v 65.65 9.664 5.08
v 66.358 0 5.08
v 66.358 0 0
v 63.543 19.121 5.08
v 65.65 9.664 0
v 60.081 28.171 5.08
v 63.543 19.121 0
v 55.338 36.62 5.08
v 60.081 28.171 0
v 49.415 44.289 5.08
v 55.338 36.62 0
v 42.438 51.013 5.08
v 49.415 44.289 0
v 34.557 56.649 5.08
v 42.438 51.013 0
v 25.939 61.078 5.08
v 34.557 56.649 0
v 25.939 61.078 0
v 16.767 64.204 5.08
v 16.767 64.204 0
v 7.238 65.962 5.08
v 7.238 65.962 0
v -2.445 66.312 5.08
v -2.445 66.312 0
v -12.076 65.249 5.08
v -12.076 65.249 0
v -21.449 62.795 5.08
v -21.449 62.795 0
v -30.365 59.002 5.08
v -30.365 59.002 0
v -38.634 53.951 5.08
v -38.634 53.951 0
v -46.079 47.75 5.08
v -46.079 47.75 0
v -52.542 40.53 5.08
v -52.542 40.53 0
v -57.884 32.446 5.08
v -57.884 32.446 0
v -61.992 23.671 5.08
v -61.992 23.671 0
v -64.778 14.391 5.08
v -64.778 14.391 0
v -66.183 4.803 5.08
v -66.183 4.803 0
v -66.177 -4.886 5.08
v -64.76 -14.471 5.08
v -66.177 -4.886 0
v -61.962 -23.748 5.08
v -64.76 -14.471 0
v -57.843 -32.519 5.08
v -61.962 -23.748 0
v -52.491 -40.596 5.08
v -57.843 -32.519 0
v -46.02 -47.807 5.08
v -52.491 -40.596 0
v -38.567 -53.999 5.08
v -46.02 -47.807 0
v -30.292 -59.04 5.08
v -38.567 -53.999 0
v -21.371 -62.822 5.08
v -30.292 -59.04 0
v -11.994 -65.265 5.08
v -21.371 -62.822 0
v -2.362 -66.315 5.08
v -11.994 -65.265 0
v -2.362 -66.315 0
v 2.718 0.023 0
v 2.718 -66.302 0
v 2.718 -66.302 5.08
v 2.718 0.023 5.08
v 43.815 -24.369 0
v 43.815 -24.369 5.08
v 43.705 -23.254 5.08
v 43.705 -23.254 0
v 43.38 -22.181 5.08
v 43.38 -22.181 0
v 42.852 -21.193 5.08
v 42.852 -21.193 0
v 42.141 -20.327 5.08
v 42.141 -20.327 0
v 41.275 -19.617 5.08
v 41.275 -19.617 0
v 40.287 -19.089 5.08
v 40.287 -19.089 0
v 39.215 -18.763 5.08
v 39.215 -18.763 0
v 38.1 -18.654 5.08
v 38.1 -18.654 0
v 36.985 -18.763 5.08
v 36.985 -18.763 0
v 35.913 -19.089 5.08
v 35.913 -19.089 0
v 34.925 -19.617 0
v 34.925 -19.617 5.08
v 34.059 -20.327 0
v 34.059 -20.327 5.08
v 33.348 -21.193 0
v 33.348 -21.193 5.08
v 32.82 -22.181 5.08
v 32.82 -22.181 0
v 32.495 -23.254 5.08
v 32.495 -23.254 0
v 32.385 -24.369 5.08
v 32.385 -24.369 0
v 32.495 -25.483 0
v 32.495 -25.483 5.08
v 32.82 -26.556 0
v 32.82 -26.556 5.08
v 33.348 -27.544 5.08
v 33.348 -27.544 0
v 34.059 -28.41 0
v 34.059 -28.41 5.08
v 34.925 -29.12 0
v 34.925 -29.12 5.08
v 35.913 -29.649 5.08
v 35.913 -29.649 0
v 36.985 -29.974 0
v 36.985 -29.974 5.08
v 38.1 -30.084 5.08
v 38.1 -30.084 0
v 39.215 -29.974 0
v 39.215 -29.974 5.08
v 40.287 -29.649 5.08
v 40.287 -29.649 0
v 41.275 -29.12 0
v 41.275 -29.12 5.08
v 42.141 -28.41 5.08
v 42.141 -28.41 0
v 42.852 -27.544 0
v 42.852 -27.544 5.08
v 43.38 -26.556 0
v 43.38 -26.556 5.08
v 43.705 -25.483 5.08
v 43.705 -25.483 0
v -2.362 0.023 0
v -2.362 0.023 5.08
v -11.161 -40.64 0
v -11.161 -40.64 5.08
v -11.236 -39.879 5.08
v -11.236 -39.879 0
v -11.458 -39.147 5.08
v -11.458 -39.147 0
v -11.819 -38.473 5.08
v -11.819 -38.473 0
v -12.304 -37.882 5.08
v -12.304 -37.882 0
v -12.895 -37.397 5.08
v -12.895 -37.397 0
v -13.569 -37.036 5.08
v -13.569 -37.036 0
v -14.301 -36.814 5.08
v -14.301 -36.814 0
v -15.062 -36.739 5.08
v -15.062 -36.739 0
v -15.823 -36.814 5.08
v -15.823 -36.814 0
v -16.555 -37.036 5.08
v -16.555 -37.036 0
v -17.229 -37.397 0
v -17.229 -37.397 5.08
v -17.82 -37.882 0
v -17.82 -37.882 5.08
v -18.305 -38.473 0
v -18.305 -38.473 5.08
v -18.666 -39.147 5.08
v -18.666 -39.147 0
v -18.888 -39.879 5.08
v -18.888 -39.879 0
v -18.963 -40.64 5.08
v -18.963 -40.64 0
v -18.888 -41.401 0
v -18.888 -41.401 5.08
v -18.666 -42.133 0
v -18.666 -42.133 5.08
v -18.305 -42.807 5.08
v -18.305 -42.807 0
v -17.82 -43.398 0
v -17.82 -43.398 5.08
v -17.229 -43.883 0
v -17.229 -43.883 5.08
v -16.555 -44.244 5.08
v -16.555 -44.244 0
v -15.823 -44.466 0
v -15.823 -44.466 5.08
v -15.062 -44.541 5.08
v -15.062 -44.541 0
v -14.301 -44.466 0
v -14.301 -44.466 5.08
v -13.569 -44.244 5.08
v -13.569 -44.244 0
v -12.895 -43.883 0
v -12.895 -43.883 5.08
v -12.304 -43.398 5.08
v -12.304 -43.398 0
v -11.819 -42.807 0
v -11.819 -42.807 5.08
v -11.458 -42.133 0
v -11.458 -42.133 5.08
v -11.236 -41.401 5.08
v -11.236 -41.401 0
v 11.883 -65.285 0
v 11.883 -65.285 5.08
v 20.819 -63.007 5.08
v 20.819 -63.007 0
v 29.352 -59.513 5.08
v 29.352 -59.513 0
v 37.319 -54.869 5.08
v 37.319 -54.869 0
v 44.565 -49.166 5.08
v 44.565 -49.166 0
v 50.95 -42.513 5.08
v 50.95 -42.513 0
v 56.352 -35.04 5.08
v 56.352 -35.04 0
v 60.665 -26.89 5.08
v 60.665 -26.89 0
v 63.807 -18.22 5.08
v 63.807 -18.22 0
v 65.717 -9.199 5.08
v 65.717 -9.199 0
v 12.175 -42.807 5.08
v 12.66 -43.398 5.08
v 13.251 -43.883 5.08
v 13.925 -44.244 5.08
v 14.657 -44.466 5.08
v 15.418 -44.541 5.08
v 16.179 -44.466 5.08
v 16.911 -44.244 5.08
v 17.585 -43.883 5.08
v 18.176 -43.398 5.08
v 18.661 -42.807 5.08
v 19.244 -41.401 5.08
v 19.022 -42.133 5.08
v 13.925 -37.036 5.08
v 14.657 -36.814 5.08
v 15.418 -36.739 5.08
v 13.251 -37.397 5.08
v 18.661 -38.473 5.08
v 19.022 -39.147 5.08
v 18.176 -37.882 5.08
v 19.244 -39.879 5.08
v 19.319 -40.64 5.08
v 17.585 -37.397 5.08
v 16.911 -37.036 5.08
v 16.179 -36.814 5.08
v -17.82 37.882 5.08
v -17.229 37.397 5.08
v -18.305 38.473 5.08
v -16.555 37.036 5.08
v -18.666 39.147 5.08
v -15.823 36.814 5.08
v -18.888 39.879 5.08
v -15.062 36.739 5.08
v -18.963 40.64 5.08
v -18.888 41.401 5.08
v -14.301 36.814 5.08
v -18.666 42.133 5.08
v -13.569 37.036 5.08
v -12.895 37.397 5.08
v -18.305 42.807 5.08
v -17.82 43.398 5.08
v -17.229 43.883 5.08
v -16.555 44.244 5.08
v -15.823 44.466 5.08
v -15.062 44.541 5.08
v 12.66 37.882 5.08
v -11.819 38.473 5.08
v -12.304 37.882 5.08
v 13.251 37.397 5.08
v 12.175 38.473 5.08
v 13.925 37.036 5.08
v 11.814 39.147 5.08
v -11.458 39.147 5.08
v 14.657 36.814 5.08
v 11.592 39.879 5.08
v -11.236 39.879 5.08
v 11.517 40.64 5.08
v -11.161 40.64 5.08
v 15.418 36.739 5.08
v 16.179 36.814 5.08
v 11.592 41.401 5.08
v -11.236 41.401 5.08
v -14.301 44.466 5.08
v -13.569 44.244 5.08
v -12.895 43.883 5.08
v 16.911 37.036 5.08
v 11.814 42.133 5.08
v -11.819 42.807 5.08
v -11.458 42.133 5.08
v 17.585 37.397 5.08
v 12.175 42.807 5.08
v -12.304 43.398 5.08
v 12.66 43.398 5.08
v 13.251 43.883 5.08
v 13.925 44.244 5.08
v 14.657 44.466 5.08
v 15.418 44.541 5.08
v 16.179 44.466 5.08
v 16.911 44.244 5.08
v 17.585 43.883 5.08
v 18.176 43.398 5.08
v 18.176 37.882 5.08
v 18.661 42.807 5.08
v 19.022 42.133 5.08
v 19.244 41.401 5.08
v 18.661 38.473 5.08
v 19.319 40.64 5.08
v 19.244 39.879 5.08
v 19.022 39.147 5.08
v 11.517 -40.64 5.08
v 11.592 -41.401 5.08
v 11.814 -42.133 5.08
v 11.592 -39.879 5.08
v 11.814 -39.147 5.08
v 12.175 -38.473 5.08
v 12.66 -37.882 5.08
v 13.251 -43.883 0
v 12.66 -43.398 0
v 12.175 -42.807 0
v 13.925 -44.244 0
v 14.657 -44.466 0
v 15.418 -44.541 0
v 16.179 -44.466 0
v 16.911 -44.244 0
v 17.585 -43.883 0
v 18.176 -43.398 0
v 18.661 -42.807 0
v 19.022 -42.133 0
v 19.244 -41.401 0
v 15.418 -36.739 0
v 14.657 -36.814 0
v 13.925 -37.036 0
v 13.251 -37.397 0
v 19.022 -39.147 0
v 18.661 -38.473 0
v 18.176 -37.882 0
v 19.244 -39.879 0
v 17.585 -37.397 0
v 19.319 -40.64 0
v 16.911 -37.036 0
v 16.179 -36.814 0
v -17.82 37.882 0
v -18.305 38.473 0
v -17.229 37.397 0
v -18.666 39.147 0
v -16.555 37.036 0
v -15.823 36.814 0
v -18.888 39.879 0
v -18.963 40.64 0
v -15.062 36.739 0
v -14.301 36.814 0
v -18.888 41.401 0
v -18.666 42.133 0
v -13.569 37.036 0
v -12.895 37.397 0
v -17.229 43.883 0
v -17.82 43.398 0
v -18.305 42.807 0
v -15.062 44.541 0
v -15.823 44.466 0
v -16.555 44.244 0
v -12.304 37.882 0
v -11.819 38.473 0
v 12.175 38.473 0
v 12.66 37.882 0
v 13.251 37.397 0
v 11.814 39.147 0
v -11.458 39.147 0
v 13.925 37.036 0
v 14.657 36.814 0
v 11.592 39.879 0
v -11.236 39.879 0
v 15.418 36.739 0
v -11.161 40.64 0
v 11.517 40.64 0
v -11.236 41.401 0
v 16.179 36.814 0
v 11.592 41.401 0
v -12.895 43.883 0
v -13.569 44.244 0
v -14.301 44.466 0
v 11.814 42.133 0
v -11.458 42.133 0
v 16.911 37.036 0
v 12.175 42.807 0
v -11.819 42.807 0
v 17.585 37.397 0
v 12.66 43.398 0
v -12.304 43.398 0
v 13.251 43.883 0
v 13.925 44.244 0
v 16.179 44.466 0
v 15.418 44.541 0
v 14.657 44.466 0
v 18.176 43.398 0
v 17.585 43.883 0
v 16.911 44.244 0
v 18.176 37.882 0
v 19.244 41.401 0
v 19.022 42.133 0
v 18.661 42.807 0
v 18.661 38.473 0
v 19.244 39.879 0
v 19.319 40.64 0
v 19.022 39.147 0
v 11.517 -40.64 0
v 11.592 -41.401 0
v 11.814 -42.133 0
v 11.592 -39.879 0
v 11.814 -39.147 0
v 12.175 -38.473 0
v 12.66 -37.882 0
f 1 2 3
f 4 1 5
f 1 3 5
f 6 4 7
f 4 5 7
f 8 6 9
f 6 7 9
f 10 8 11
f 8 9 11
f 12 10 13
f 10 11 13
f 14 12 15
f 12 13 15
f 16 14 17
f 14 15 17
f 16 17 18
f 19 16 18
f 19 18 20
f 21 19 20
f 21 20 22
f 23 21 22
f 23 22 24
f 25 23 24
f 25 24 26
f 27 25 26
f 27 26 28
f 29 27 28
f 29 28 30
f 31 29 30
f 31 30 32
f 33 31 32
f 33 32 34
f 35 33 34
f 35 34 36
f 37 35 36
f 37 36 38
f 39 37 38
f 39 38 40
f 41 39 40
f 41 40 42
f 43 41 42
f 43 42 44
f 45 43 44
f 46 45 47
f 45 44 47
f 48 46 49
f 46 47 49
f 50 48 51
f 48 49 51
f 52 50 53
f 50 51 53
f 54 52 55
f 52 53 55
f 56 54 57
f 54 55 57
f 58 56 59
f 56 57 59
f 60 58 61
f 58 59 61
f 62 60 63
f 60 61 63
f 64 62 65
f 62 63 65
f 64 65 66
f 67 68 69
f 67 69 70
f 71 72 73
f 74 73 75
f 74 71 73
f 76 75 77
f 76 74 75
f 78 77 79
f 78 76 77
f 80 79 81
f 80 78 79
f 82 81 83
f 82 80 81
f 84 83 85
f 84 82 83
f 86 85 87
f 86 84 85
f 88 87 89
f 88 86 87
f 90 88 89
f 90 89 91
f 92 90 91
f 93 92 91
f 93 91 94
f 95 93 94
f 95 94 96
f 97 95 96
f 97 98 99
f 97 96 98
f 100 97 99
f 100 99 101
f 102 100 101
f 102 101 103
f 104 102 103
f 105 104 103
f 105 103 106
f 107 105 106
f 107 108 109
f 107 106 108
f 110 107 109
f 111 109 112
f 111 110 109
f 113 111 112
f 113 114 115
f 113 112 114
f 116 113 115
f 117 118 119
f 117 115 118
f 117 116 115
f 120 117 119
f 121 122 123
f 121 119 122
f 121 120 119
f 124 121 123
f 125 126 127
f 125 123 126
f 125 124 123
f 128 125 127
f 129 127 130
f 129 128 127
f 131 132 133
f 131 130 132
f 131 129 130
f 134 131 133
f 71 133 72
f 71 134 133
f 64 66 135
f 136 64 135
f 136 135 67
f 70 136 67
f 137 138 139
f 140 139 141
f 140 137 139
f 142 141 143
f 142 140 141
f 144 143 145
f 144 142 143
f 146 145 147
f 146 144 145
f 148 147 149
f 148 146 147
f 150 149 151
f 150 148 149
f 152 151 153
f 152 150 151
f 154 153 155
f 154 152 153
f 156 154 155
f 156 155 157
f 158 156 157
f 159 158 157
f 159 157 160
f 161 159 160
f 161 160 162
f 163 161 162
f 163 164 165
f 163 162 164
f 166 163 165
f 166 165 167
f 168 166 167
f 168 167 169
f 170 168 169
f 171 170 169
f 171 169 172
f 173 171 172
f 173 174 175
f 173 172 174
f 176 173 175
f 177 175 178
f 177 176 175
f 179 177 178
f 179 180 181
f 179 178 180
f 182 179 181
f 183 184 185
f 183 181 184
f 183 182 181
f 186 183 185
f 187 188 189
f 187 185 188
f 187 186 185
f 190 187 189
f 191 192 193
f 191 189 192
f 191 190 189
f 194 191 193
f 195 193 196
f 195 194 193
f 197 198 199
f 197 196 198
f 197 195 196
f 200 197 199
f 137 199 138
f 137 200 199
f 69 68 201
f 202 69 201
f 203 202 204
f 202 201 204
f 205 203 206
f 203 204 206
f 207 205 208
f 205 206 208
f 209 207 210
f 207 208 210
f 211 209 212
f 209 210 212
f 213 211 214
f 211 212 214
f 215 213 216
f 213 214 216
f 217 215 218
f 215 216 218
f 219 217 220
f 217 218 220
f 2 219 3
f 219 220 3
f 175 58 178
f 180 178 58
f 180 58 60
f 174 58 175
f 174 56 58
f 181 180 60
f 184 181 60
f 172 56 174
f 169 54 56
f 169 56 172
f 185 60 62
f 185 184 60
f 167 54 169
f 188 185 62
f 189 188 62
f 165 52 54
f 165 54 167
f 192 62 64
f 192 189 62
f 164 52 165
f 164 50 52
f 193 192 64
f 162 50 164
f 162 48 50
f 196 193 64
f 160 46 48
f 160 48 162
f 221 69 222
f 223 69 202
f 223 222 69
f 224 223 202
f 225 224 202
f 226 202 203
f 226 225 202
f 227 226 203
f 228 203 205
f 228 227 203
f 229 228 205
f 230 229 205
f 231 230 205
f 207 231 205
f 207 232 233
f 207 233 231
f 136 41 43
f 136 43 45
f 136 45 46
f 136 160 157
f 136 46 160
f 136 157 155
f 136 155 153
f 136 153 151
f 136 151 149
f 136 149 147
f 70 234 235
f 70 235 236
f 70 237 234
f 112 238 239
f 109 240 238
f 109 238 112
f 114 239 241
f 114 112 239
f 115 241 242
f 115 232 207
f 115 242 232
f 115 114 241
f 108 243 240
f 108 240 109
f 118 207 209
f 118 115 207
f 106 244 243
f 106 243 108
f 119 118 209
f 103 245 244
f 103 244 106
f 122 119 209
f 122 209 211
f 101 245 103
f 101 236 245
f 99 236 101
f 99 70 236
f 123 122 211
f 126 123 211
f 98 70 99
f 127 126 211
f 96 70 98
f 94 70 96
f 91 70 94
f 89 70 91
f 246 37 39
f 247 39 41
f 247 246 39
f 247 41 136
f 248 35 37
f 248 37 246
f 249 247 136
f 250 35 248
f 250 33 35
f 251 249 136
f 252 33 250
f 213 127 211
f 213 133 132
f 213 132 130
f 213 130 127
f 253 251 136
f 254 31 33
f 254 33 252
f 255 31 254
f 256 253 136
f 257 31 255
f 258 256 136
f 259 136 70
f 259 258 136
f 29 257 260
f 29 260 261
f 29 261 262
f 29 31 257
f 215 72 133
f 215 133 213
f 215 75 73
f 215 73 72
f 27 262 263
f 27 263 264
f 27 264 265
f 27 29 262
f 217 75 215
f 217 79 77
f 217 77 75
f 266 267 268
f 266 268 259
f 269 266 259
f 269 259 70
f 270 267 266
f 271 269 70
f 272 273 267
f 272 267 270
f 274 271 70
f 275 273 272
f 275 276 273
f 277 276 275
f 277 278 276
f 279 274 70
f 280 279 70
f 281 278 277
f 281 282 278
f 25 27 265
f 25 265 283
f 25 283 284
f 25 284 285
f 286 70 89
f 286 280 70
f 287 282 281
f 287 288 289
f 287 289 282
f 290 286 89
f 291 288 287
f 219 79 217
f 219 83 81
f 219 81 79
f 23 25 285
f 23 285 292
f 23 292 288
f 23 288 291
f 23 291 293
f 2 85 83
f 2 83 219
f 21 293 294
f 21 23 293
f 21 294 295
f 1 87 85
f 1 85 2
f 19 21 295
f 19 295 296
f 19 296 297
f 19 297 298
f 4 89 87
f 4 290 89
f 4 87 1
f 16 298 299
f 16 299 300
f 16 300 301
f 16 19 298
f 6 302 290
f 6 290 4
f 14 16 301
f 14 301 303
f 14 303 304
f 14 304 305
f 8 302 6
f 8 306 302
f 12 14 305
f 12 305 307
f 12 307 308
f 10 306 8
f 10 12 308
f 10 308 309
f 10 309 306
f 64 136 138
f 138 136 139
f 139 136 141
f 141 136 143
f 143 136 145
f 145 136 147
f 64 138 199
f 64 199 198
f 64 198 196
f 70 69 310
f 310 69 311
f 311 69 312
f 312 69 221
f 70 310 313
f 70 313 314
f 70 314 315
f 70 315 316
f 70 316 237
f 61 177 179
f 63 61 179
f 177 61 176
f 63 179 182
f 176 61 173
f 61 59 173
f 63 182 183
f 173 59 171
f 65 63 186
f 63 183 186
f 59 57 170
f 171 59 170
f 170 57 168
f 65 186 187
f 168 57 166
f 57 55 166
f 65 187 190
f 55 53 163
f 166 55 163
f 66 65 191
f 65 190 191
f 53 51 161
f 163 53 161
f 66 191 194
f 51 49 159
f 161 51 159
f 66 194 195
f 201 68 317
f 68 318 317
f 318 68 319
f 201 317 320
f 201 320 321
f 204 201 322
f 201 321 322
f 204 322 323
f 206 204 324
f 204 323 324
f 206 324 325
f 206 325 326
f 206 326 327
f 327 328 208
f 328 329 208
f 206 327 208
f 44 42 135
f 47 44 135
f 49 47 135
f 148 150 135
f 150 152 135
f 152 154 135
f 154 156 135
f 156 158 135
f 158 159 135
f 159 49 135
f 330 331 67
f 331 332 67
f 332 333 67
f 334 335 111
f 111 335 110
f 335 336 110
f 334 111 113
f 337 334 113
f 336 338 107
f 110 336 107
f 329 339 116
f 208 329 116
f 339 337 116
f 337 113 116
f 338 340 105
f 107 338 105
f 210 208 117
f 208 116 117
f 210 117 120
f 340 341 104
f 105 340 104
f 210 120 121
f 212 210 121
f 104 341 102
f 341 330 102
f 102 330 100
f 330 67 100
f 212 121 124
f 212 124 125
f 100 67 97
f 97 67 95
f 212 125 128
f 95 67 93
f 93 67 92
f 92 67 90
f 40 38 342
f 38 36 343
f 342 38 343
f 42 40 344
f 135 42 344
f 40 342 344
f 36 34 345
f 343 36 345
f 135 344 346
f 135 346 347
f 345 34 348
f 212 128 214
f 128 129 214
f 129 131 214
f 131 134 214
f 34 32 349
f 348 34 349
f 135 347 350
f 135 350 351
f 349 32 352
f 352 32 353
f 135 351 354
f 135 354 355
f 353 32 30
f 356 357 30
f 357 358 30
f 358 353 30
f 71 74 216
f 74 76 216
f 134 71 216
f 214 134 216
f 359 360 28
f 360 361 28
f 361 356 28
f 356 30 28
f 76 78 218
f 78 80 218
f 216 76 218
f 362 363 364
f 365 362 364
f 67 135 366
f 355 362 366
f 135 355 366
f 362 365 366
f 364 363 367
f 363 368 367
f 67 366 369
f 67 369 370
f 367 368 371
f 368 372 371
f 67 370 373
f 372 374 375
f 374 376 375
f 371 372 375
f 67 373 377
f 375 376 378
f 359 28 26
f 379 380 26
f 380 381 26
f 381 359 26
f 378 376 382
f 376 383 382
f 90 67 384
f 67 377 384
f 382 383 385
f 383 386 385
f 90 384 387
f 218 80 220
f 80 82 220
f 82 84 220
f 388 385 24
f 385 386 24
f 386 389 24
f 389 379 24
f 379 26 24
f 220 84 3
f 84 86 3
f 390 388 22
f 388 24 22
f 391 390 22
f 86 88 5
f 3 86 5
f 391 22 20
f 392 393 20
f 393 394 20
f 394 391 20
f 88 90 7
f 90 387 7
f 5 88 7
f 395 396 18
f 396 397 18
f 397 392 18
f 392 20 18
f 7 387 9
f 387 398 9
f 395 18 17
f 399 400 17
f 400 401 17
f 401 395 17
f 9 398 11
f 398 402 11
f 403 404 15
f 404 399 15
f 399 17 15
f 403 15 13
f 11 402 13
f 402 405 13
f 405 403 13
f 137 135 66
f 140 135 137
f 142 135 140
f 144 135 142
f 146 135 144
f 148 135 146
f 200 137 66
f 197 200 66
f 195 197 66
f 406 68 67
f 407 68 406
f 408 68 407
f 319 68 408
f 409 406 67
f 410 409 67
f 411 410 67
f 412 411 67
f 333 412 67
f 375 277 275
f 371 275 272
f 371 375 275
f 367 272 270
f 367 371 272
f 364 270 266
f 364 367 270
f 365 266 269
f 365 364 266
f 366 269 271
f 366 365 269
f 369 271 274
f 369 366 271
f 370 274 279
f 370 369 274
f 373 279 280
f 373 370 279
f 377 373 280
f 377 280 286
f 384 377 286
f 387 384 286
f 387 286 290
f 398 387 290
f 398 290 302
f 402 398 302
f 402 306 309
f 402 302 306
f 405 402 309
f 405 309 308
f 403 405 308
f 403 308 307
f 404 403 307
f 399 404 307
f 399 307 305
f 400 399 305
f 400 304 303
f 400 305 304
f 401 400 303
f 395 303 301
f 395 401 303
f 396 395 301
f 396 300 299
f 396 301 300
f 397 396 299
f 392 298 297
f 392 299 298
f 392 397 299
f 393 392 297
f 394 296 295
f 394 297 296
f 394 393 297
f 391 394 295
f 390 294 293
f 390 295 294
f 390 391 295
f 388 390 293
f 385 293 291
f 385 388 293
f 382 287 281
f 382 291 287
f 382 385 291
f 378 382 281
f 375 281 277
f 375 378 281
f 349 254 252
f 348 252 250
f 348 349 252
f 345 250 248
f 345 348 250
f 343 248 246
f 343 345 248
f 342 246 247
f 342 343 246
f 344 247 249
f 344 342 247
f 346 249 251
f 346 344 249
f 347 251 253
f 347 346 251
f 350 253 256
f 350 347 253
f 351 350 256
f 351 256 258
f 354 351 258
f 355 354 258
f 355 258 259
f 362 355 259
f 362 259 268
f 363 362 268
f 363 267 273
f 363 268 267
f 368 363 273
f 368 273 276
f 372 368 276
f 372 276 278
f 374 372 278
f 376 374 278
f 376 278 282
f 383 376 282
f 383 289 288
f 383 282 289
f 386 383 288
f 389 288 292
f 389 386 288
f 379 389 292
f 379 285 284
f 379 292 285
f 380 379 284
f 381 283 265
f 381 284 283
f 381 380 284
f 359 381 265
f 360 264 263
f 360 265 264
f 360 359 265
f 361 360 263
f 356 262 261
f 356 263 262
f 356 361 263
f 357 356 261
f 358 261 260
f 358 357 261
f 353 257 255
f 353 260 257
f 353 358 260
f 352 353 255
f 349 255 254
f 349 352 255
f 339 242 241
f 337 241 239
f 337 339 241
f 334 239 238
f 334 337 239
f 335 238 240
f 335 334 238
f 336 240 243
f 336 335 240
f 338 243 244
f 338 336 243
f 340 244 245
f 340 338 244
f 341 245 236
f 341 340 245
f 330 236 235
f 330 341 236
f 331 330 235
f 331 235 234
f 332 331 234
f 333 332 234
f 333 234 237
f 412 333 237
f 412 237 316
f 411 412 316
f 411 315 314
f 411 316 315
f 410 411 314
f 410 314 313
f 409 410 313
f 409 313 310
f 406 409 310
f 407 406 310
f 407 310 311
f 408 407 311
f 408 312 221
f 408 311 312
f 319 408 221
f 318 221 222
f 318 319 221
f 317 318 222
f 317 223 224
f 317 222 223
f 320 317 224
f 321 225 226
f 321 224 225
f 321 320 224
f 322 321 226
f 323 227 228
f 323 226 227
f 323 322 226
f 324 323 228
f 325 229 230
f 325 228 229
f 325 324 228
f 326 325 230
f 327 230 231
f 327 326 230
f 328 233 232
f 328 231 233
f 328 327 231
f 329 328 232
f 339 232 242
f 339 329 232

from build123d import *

# Parameters (mm, degrees)
SKETCH1_R           = 66.3575
BOSS_EXTRUDE1_DEPTH = 5.08
CUT_EXTRUDE2_REACH  = 95.981
SKETCH3_R           = 3.900616975
SKETCH3_R_2         = 5.715
SKETCH3_W           = 5.08
SKETCH3_H           = 67.8815


with BuildPart() as part:
    # Sketch1 → Boss-Extrude1 (new body)
    with BuildSketch(Plane.XY):
        Circle(SKETCH1_R)
    extrude(amount=BOSS_EXTRUDE1_DEPTH)

    # Sketch3 → Cut-Extrude2 (cut, up to next)
    with BuildSketch(Plane.XY, mode=Mode.PRIVATE) as cut_extrude2_sk1:
        with Locations((-15.06192248, -40.64)):
            Circle(SKETCH3_R)
    cut_extrude2_tool1 = extrude(cut_extrude2_sk1.sketch, amount=CUT_EXTRUDE2_REACH, mode=Mode.PRIVATE) & part.part
    # Sketch3 → Cut-Extrude2 (cut, up to next)
    with BuildSketch(Plane.XY, mode=Mode.PRIVATE) as cut_extrude2_sk2:
        with Locations((15.41807752, -40.64)):
            Circle(SKETCH3_R)
    cut_extrude2_tool2 = extrude(cut_extrude2_sk2.sketch, amount=CUT_EXTRUDE2_REACH, mode=Mode.PRIVATE) & part.part
    # Sketch3 → Cut-Extrude2 (cut, up to next)
    with BuildSketch(Plane.XY, mode=Mode.PRIVATE) as cut_extrude2_sk3:
        with Locations(Location((15.41807752, 40.64, 0), (0, 0, 180))):
            Circle(SKETCH3_R)
    cut_extrude2_tool3 = extrude(cut_extrude2_sk3.sketch, amount=CUT_EXTRUDE2_REACH, mode=Mode.PRIVATE) & part.part
    # Sketch3 → Cut-Extrude2 (cut, up to next)
    with BuildSketch(Plane.XY, mode=Mode.PRIVATE) as cut_extrude2_sk4:
        with Locations(Location((-15.06192248, 40.64, 0), (0, 0, 180))):
            Circle(SKETCH3_R)
    cut_extrude2_tool4 = extrude(cut_extrude2_sk4.sketch, amount=CUT_EXTRUDE2_REACH, mode=Mode.PRIVATE) & part.part
    # Sketch3 → Cut-Extrude2 (cut, up to next)
    with BuildSketch(Plane.XY, mode=Mode.PRIVATE) as cut_extrude2_sk5:
        with Locations((38.1, -24.368533315)):
            Circle(SKETCH3_R_2)
    cut_extrude2_tool5 = extrude(cut_extrude2_sk5.sketch, amount=CUT_EXTRUDE2_REACH, mode=Mode.PRIVATE) & part.part
    # Sketch3 → Cut-Extrude2 (cut, up to next)
    with BuildSketch(Plane.XY, mode=Mode.PRIVATE) as cut_extrude2_sk6:
        with Locations((0.17807752, -33.91789821)):
            Rectangle(SKETCH3_W, SKETCH3_H)
    cut_extrude2_tool6 = extrude(cut_extrude2_sk6.sketch, amount=CUT_EXTRUDE2_REACH, mode=Mode.PRIVATE) & part.part
    add(cut_extrude2_tool1.solids().sort_by_distance((-15.061922, -40.64, 0))[0], mode=Mode.SUBTRACT)
    add(cut_extrude2_tool2.solids().sort_by_distance((15.418078, -40.64, 0))[0], mode=Mode.SUBTRACT)
    add(cut_extrude2_tool3.solids().sort_by_distance((15.418078, 40.64, 0))[0], mode=Mode.SUBTRACT)
    add(cut_extrude2_tool4.solids().sort_by_distance((-15.061922, 40.64, 0))[0], mode=Mode.SUBTRACT)
    add(cut_extrude2_tool5.solids().sort_by_distance((38.1, -24.368533, 0))[0], mode=Mode.SUBTRACT)
    add(cut_extrude2_tool6.solids().sort_by_distance((0.178078, -33.917898, 0))[0], mode=Mode.SUBTRACT)


solid = part.part
